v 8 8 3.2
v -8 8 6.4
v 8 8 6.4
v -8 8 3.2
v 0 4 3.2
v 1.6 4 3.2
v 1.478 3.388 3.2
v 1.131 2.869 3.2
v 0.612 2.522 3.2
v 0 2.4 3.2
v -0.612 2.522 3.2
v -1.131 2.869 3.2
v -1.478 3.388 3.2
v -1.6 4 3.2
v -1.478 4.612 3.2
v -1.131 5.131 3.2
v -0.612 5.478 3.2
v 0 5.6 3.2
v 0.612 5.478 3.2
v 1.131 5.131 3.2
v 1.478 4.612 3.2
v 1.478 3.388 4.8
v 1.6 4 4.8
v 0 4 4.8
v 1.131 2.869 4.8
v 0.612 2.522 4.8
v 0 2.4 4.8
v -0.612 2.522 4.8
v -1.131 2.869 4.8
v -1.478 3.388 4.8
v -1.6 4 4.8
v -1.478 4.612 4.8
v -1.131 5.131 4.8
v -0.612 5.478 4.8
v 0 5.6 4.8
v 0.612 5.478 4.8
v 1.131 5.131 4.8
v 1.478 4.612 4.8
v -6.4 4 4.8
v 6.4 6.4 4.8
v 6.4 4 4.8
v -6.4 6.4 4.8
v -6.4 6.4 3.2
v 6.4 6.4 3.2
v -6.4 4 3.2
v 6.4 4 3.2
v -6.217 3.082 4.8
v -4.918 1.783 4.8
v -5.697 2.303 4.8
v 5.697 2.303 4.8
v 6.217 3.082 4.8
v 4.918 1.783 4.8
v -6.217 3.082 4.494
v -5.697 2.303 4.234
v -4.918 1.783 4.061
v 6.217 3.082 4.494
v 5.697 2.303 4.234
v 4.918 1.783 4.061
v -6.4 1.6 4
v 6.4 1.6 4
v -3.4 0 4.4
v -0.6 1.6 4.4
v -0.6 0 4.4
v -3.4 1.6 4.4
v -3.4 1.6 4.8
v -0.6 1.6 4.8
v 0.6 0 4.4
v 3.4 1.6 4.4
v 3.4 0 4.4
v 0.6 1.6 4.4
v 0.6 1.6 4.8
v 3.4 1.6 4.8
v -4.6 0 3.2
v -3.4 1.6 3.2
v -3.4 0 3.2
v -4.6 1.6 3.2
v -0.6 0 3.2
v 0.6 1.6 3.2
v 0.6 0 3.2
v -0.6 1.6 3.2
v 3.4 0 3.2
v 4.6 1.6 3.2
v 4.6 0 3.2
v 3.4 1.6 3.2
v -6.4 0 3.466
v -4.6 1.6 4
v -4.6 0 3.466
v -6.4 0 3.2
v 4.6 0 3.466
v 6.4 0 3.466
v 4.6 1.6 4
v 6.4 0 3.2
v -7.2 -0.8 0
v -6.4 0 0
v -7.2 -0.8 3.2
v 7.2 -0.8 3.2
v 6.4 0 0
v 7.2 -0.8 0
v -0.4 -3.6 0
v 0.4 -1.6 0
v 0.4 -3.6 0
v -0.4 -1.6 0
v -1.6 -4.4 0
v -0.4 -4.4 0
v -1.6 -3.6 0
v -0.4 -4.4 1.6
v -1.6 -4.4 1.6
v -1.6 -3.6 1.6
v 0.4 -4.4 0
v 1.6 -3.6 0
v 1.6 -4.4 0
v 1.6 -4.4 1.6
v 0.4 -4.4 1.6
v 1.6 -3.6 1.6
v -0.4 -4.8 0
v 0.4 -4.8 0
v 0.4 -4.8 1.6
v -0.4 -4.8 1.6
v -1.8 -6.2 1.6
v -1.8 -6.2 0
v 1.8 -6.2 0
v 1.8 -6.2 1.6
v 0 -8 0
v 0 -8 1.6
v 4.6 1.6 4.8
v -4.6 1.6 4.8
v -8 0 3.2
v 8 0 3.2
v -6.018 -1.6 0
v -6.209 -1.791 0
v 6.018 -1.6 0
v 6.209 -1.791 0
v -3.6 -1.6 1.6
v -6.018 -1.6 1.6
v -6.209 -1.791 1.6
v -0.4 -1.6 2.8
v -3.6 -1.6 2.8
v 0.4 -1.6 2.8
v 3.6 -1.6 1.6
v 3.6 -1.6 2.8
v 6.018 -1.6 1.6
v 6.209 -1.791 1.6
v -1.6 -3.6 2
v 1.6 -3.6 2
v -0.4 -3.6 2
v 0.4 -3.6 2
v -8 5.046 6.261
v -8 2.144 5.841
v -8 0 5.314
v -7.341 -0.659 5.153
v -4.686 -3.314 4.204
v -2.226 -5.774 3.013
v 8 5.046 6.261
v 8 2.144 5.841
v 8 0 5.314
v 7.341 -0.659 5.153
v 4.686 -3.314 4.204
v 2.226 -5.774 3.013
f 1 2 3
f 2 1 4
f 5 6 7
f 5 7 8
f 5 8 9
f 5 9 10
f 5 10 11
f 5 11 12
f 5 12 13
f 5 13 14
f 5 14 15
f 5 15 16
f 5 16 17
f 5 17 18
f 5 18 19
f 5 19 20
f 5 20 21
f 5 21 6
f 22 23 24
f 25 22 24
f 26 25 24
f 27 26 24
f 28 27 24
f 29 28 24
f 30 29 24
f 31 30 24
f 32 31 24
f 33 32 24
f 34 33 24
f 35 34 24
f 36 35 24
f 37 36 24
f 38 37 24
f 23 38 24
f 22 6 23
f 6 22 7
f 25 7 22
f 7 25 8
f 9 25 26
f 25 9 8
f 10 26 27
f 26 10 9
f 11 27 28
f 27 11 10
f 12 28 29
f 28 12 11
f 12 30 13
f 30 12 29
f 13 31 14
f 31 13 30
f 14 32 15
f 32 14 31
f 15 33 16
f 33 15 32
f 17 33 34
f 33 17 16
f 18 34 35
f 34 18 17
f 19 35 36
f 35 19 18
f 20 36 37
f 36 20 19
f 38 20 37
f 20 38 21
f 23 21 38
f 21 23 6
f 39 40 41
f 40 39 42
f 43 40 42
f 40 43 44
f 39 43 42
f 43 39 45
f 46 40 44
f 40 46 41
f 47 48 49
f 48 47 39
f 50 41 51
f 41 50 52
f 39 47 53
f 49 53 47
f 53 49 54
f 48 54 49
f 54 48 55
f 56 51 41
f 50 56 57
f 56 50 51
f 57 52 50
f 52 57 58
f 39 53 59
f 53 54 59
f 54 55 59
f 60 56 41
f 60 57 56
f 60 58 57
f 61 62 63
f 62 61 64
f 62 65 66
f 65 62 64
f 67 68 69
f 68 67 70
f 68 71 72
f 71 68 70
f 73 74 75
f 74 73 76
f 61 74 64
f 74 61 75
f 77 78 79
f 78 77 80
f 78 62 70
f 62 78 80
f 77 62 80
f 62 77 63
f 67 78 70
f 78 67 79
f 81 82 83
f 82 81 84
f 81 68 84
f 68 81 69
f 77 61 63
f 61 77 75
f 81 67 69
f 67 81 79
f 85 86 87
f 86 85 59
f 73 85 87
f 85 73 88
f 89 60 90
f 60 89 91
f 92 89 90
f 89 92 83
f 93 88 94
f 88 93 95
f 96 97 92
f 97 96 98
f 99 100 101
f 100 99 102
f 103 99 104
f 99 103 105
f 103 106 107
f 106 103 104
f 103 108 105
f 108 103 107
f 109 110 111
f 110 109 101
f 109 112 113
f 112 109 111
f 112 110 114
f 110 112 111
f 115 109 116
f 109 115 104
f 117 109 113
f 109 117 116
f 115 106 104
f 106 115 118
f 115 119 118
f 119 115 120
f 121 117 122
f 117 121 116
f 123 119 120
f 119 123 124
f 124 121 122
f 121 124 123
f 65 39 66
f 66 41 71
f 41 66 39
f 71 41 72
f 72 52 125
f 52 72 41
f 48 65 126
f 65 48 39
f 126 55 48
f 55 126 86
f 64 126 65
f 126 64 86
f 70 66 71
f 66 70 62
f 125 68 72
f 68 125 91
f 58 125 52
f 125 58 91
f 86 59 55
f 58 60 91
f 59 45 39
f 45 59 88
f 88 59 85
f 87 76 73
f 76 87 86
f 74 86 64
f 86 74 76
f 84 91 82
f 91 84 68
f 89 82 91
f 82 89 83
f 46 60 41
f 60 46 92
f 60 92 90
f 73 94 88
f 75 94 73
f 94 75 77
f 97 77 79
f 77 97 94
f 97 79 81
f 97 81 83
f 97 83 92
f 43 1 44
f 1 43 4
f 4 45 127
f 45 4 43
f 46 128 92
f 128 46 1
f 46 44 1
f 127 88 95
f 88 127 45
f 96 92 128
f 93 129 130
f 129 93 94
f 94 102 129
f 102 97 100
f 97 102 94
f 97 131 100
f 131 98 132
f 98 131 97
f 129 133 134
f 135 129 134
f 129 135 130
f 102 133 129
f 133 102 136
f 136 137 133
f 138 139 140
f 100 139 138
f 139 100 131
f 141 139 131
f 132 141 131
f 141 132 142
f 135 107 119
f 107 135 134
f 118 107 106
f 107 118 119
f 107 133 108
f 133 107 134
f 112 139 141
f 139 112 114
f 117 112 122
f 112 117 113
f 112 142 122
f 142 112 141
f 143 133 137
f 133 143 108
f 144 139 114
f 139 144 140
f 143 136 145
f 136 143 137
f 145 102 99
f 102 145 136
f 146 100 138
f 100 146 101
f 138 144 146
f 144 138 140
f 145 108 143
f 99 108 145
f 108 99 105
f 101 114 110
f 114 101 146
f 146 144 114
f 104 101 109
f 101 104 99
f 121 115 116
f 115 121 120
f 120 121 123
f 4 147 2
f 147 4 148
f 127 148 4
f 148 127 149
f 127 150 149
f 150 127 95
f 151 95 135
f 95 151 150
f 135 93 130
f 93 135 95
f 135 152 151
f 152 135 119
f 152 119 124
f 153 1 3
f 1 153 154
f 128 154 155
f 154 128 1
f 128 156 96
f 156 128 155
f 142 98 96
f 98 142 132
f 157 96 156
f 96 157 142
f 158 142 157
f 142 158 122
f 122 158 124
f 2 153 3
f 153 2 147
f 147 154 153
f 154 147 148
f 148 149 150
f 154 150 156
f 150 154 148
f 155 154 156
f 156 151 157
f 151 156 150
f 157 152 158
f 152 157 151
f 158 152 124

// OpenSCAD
use <../lib.scad>
use <s/66956s01.scad>
function ldraw_lib__66956() = [
// 0 Slope Brick Curved  2 x  2 with Double Cutout
// 0 Name: 66956.dat
// 0 Author: Massimo Maso [Sirio]
// 0 !LDRAW_ORG Part UPDATE 2023-04
// 0 !LICENSE Licensed under CC BY 4.0 : see CAreadme.txt
// 
// 0 BFC CERTIFY CCW
  [0,"BFC","CERTIFY"],
  [0,"BFC","CCW"],
// 
// 0 !HISTORY 2020-08-03 [Sirio] File preparation for LDraw
// 0 !HISTORY 2023-08-25 [OrionP] Official Update 2023-04
// 
// 
// 0 // Subpart
// 1 16 0 0 0 1 0 0 0 1 0 0 0 1 s\66956s01.dat
  [1,16,0,0,0,1,0,0,0,1,0,0,0,1, ldraw_lib__s__66956s01()],
// 0 // Patternable faces
// 4 16 20 -16 20 -20 -16 20 -20 -15.6524 12.616 20 -15.6524 12.616
  [4,16,20,-16,20,-20,-16,20,-20,-15.6524,12.616,20,-15.6524,12.616],
// 4 16 20 -15.6524 12.616 -20 -15.6524 12.616 -20 -14.6036 5.36 20 -14.6036 5.36
  [4,16,20,-15.6524,12.616,-20,-15.6524,12.616,-20,-14.6036,5.36,20,-14.6036,5.36],
// 3 16 -20 -14.6036 5.36 -20 -13.2852 0 -18.352 -12.8827 -1.648
  [3,16,-20,-14.6036,5.36,-20,-13.2852,0,-18.352,-12.8827,-1.648],
// 4 16 20 -14.6036 5.36 -20 -14.6036 5.36 -18.352 -12.8827 -1.648 18.352 -12.8827 -1.648
  [4,16,20,-14.6036,5.36,-20,-14.6036,5.36,-18.352,-12.8827,-1.648,18.352,-12.8827,-1.648],
// 3 16 20 -13.2852 0 20 -14.6036 5.36 18.352 -12.8827 -1.648
  [3,16,20,-13.2852,0,20,-14.6036,5.36,18.352,-12.8827,-1.648],
// 4 16 18.352 -12.8827 -1.648 -18.352 -12.8827 -1.648 -11.716 -10.5099 -8.284 11.716 -10.5099 -8.284
  [4,16,18.352,-12.8827,-1.648,-18.352,-12.8827,-1.648,-11.716,-10.5099,-8.284,11.716,-10.5099,-8.284],
// 4 16 11.716 -10.5099 -8.284 -11.716 -10.5099 -8.284 -5.564 -7.5316 -14.436 5.564 -7.5316 -14.436
  [4,16,11.716,-10.5099,-8.284,-11.716,-10.5099,-8.284,-5.564,-7.5316,-14.436,5.564,-7.5316,-14.436],
// 3 16 5.564 -7.5316 -14.436 -5.564 -7.5316 -14.436 0 -4 -20
  [3,16,5.564,-7.5316,-14.436,-5.564,-7.5316,-14.436,0,-4,-20],
];
module ldraw_lib__66956(step=0, col=false, unit=2/5, alt=false, line=0.2, solid=!$preview)
    makepoly(ldraw_lib__66956(), step=step, col=col, unit=unit, alt=alt, line=line, solid=solid);
ldraw_lib__66956(line=0.2);
